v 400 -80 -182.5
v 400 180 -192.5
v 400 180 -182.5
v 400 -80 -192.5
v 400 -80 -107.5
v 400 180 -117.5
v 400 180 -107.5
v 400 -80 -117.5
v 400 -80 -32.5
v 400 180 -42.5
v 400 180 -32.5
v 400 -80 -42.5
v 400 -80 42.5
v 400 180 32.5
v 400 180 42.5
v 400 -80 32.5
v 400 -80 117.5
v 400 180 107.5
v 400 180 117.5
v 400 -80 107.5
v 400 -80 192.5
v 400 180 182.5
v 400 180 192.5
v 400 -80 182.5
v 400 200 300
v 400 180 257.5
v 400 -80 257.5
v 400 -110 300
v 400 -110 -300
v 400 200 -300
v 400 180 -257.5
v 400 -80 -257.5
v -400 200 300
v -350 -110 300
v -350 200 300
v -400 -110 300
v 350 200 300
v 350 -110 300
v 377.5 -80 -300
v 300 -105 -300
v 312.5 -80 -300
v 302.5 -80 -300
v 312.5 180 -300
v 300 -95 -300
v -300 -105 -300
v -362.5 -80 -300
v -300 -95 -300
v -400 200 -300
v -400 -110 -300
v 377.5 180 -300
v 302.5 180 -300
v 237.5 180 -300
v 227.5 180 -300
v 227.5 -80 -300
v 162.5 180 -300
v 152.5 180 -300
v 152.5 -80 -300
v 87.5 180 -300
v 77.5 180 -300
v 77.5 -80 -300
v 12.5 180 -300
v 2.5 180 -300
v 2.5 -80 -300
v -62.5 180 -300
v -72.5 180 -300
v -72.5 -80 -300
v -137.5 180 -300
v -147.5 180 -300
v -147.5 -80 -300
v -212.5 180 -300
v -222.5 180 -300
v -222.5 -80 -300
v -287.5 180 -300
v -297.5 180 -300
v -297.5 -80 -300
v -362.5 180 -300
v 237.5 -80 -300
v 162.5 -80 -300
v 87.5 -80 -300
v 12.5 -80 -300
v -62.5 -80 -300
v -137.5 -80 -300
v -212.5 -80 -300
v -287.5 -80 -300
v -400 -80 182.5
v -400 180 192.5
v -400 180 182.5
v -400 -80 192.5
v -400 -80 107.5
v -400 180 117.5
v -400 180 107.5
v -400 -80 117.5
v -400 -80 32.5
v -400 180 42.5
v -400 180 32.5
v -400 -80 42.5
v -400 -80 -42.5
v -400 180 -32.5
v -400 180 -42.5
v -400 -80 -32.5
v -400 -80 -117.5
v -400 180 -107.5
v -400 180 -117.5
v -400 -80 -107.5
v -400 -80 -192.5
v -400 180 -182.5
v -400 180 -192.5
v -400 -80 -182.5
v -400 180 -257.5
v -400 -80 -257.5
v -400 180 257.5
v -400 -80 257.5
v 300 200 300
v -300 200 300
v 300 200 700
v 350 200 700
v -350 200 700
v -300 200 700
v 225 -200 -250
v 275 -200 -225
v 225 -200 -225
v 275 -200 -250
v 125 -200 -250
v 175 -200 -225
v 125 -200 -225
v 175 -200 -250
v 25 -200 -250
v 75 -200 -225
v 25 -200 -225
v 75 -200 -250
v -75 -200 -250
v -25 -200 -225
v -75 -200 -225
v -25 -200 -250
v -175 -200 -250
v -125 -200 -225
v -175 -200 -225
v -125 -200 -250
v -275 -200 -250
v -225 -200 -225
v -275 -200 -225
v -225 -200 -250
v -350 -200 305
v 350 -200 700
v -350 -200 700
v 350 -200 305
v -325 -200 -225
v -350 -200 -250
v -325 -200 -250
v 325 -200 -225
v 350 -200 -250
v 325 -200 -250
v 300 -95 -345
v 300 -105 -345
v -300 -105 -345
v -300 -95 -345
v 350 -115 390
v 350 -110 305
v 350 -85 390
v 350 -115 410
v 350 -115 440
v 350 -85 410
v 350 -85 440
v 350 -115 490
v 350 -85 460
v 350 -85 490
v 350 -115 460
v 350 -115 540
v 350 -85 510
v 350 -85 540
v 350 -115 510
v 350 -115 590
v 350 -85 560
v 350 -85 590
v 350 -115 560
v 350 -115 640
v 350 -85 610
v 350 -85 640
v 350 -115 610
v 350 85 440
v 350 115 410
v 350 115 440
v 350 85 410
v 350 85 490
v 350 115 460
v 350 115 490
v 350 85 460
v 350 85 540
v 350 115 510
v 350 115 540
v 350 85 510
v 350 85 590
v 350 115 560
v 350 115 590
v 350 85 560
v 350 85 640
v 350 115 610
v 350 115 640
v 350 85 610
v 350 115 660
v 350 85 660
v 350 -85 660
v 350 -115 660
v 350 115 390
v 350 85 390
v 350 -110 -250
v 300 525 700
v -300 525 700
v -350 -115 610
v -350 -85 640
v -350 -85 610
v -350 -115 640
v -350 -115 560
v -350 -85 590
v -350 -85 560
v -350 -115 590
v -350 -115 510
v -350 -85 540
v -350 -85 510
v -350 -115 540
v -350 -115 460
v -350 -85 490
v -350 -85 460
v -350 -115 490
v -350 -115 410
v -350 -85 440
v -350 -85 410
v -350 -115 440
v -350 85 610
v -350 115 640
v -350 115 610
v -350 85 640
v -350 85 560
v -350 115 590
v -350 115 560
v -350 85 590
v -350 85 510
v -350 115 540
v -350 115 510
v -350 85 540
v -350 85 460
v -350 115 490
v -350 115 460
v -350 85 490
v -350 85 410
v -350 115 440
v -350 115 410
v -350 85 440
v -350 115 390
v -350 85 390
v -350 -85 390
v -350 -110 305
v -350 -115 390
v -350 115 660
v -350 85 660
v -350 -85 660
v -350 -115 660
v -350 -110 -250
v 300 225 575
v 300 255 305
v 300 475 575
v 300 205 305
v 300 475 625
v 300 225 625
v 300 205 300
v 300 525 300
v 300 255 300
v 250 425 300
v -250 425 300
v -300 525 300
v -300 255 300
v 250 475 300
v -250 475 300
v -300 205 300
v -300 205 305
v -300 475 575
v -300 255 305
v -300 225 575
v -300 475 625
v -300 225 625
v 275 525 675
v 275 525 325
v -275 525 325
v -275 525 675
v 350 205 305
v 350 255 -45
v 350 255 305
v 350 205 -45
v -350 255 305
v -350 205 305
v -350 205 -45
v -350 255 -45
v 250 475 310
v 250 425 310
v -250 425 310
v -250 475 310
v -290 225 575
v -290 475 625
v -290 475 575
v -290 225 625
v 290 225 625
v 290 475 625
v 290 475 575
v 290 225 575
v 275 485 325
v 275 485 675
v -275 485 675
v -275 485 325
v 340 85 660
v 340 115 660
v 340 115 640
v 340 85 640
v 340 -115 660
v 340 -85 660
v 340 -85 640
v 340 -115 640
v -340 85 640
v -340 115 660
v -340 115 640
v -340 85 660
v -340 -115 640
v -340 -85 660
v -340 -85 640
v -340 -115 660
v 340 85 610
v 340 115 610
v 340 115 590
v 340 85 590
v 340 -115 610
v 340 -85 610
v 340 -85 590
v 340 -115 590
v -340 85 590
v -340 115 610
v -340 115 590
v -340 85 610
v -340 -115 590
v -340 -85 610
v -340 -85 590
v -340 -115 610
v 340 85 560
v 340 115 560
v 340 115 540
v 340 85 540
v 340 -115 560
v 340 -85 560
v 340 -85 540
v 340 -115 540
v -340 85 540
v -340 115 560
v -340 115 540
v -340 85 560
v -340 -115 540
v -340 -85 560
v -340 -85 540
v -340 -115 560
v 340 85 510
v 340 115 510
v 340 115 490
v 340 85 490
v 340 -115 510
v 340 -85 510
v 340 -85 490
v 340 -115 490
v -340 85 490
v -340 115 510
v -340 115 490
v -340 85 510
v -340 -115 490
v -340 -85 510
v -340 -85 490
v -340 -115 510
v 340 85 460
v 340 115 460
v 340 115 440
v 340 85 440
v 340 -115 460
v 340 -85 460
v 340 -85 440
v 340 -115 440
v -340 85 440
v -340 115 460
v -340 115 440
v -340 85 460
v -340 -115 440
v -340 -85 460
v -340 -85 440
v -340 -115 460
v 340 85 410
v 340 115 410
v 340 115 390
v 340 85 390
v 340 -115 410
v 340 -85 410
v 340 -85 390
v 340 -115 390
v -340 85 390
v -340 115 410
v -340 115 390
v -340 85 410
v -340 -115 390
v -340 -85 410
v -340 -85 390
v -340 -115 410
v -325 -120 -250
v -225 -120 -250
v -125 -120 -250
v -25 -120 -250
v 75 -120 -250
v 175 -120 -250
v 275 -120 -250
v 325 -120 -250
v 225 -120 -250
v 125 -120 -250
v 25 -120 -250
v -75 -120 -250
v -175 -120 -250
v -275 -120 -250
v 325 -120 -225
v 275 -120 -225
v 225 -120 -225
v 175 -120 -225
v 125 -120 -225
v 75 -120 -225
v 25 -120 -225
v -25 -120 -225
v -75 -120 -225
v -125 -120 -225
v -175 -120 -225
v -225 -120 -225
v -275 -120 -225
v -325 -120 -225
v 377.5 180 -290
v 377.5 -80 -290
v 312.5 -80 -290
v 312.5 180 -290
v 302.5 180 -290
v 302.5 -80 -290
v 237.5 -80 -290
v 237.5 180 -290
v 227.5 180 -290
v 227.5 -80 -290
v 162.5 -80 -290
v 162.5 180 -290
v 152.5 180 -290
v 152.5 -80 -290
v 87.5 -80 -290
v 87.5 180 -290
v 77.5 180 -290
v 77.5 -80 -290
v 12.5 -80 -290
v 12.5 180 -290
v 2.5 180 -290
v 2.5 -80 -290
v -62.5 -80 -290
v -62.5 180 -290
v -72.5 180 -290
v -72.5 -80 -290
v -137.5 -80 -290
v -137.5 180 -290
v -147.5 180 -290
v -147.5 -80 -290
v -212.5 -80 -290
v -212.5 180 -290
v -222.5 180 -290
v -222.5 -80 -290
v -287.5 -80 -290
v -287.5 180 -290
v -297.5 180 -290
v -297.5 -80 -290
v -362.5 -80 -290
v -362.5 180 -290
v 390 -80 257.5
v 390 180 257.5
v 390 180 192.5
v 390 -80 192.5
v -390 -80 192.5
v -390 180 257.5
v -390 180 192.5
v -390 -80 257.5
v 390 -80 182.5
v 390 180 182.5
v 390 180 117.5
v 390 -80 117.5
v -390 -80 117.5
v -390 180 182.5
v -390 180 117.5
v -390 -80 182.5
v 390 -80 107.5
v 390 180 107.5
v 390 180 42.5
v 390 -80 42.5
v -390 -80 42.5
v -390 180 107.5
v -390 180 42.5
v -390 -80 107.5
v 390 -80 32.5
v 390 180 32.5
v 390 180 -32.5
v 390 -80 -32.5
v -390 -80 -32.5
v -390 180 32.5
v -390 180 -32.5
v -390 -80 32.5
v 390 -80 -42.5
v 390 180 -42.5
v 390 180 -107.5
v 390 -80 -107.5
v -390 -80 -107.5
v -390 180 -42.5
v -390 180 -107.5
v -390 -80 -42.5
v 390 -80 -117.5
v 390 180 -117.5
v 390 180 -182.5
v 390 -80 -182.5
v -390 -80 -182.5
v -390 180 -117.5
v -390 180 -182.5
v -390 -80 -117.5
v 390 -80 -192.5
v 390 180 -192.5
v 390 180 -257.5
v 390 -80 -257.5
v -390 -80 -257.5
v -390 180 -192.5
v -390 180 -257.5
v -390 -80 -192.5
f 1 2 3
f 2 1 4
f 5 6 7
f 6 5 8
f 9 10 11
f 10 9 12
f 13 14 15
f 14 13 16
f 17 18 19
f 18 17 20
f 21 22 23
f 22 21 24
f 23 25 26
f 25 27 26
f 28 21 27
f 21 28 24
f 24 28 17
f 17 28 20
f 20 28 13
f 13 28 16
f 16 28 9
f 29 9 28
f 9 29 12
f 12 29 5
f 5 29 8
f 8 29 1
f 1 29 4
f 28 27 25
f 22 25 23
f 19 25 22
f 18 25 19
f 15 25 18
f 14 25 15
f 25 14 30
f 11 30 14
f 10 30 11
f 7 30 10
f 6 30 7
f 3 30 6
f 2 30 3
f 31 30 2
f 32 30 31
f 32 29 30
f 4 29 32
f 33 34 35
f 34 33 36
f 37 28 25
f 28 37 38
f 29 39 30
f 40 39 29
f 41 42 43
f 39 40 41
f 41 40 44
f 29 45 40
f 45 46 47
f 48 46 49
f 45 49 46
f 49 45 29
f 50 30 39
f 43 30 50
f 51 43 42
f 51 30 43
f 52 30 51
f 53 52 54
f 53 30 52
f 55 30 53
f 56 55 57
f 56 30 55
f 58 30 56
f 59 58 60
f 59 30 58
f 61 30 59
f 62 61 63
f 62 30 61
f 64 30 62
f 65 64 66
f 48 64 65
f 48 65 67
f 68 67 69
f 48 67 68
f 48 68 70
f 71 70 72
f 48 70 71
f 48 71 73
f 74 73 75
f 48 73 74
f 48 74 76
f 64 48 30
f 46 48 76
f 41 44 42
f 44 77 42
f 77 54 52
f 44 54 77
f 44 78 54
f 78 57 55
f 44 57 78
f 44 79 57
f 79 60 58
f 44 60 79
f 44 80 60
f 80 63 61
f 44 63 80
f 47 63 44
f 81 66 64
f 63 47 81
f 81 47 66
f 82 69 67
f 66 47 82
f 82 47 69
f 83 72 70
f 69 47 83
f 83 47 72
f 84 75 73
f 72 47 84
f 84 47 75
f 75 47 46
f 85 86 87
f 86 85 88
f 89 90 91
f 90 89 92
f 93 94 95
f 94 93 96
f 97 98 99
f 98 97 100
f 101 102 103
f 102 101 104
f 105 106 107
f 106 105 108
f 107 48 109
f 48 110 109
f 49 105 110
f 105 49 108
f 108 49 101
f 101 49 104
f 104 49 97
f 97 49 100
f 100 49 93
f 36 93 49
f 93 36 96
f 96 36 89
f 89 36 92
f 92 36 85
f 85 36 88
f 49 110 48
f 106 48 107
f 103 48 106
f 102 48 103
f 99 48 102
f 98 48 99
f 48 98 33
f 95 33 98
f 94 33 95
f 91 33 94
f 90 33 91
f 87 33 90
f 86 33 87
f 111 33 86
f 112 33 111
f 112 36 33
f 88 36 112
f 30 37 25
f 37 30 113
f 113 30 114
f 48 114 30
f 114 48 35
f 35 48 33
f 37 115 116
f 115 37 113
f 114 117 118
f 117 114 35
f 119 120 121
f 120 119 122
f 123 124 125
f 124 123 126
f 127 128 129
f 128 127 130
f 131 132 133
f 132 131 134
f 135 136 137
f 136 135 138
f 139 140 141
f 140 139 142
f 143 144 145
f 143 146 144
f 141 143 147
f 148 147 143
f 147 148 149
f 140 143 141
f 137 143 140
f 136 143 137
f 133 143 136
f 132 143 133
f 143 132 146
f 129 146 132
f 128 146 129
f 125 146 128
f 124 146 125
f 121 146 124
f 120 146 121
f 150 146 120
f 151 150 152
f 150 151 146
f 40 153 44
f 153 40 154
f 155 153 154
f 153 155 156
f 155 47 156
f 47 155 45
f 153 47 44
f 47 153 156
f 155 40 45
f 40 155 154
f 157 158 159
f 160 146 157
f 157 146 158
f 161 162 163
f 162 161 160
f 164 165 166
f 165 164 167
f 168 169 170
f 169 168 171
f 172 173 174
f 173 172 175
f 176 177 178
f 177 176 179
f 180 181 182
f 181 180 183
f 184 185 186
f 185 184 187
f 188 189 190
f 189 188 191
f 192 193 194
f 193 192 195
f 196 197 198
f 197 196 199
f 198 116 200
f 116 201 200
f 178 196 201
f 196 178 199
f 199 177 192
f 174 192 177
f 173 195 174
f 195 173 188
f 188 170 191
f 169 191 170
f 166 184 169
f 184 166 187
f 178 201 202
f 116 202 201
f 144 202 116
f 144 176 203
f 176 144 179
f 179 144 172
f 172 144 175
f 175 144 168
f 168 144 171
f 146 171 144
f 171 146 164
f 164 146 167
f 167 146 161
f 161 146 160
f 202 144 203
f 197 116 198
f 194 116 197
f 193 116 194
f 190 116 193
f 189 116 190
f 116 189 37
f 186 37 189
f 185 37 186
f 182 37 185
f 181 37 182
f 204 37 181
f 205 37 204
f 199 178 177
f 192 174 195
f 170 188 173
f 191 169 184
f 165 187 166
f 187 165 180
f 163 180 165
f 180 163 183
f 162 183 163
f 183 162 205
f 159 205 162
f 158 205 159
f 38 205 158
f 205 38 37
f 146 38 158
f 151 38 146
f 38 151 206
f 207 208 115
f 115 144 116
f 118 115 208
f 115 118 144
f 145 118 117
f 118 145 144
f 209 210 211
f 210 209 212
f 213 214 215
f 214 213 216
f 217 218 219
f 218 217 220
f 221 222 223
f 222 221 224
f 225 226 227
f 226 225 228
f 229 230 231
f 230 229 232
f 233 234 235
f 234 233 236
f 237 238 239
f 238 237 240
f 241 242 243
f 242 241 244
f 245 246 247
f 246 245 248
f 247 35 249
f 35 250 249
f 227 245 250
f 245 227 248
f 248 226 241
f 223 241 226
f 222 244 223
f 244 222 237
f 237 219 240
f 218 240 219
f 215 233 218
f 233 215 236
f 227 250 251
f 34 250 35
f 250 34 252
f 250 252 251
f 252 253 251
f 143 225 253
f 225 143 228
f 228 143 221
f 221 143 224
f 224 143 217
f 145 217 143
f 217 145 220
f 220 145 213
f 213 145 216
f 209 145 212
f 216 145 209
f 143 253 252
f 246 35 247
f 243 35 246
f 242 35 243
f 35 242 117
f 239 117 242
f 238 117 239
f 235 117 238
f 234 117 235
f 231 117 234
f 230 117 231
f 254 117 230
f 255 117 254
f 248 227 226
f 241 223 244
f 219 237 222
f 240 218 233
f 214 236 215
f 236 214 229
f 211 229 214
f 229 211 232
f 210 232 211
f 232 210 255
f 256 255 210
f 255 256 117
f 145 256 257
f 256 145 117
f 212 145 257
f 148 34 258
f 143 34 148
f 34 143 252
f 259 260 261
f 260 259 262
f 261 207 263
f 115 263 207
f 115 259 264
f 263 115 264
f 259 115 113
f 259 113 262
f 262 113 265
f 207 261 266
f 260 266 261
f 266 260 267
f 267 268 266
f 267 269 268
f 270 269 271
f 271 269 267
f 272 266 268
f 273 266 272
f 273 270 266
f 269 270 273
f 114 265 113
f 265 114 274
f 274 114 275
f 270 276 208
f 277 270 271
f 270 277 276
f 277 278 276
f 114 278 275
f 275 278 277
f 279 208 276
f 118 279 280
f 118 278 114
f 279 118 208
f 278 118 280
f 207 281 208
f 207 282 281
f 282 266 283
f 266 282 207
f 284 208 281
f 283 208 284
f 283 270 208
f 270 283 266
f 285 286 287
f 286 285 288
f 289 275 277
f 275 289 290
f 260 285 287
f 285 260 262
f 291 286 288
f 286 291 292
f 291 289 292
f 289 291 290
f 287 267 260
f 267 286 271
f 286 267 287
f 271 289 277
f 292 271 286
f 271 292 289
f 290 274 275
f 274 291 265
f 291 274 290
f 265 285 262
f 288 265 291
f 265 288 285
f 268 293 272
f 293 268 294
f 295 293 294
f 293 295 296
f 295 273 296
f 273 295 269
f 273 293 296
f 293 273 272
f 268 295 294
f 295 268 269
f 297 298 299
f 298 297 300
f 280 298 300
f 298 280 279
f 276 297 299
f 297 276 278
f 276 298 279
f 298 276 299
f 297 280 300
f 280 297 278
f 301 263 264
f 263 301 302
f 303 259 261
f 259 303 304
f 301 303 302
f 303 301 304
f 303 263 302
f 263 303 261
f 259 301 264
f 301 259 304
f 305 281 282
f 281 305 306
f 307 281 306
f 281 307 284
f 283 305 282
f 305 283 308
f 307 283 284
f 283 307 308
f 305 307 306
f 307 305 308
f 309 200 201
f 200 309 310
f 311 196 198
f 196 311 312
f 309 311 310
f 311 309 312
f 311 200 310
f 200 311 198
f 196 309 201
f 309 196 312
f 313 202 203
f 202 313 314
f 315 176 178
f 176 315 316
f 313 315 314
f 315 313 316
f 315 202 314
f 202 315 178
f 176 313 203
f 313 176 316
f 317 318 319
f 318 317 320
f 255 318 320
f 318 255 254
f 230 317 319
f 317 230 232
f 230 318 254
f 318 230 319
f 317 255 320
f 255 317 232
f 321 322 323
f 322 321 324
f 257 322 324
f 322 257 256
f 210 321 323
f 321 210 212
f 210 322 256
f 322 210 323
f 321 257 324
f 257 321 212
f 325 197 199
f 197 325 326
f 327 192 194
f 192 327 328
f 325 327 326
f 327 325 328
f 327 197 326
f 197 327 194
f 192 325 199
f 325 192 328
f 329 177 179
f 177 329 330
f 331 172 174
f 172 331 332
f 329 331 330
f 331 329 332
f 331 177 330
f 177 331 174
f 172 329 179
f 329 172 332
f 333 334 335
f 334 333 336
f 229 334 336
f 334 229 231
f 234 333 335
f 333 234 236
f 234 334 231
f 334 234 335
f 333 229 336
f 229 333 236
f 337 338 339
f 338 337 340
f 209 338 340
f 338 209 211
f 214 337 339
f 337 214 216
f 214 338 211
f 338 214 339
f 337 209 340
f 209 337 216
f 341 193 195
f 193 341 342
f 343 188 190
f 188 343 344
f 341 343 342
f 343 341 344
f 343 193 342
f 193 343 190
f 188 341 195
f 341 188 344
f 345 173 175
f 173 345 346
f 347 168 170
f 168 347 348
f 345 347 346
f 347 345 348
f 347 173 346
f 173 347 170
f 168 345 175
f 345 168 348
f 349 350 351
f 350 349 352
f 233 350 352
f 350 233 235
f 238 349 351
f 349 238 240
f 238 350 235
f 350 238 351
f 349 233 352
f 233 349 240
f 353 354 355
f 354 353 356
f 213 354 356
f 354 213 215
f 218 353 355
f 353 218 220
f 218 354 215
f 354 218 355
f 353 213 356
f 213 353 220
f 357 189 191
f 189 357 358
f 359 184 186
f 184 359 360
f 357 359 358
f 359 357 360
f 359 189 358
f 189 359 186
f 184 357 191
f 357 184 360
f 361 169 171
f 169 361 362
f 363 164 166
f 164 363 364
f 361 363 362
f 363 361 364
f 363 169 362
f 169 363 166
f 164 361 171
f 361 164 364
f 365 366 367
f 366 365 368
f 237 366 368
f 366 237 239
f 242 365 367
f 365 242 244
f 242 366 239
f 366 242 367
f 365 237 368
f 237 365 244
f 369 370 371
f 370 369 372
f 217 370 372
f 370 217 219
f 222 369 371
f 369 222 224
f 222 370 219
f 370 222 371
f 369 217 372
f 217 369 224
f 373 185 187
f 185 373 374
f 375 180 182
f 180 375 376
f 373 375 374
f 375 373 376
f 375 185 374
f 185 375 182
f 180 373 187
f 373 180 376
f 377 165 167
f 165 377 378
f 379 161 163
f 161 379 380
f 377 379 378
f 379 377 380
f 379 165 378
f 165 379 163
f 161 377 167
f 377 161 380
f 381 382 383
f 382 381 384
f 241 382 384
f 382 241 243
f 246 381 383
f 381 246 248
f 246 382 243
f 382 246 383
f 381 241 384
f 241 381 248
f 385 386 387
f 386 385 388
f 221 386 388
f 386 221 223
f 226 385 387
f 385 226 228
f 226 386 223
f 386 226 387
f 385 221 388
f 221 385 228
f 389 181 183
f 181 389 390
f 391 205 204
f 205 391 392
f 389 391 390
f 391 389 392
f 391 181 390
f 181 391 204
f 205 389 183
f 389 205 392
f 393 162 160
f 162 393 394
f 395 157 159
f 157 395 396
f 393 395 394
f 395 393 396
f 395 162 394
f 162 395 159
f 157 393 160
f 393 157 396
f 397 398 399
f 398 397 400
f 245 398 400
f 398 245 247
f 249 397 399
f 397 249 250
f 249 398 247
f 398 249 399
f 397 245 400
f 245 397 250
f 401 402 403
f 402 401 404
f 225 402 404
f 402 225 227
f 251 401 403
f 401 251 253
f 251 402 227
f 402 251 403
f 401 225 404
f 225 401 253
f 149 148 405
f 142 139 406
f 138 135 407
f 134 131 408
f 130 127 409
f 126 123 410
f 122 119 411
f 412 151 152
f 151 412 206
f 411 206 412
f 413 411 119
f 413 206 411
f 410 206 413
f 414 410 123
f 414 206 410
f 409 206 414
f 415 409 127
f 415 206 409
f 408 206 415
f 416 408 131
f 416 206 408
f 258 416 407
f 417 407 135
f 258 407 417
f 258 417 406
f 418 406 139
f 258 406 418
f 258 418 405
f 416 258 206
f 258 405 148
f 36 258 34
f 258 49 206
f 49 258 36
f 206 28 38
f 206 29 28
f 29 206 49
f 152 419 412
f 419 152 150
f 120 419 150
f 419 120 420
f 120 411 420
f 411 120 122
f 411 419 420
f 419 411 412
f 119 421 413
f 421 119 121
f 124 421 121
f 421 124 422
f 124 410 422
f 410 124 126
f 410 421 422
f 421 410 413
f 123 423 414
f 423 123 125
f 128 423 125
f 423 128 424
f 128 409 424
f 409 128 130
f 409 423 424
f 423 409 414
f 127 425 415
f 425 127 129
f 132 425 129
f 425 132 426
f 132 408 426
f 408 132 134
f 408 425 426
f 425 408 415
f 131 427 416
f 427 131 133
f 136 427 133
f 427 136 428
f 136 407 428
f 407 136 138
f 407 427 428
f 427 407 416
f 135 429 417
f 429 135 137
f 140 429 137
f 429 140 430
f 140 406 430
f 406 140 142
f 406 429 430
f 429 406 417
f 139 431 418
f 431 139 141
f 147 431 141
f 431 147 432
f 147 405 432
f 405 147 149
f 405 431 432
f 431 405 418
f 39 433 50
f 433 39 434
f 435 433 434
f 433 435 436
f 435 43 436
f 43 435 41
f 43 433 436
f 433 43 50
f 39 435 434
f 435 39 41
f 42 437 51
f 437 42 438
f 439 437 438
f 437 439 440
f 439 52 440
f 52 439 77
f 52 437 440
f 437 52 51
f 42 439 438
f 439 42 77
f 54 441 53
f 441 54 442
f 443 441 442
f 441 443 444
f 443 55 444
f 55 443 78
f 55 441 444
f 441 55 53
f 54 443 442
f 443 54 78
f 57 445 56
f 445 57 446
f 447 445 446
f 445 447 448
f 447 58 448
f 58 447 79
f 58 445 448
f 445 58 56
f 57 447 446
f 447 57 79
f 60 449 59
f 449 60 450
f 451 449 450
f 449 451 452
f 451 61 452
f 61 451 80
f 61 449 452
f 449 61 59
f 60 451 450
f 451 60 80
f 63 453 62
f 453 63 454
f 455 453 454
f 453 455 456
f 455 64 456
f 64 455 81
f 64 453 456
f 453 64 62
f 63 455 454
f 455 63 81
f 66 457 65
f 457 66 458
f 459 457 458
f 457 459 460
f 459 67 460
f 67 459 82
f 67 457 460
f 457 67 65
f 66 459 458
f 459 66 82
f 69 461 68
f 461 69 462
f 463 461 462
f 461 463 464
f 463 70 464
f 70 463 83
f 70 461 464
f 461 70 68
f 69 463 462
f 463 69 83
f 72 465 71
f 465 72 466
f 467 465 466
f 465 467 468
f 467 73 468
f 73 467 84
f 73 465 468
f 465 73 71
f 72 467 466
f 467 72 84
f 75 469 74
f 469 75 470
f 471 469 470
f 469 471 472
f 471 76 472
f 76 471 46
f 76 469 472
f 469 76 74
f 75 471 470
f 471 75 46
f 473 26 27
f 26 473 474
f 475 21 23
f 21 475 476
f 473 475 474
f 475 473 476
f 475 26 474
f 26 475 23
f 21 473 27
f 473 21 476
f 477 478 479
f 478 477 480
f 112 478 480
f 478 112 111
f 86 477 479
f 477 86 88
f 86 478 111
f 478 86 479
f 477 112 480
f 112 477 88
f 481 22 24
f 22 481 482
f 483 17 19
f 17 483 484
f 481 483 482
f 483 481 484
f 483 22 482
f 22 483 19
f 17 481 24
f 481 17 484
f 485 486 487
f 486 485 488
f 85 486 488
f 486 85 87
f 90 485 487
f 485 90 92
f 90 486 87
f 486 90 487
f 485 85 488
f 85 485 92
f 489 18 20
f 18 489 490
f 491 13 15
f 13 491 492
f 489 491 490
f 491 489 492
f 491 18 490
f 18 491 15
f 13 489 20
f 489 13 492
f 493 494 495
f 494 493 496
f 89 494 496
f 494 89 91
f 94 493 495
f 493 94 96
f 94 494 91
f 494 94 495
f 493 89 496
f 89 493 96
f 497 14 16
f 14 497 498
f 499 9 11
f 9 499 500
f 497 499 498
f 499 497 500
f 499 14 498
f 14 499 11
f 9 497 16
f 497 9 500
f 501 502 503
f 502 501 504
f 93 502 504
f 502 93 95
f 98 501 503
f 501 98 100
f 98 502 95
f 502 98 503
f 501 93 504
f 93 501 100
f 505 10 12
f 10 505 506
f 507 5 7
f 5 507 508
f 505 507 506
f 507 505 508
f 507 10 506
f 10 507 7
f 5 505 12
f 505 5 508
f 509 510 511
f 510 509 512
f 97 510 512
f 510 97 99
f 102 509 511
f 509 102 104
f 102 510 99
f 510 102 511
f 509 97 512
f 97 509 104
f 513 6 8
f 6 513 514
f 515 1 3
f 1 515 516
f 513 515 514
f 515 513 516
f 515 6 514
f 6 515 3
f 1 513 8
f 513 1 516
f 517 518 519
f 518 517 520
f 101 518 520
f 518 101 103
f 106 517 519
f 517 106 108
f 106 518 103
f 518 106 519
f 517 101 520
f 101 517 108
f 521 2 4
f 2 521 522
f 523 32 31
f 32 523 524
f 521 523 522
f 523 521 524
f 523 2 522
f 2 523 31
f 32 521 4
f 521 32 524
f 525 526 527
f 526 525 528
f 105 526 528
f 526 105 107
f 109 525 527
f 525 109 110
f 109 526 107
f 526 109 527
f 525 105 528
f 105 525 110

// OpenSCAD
$fs=0.25;$fa=6;
difference(){difference(){difference(){difference(){difference(){difference(){union() {
cube([800,400,600],center=true);
translate([0,-100,-320])cube([600,10,50],center=true);
translate([0,0,500])cube([700,400,400],center=true);
translate([0,350,500])cube([600,350,400],center=true);
translate([0,230,130])cube([700,50,350],center=true);
}
translate([0,450,300])cube([500,50,20],center=true);
translate([-300,350,600])cube([20,250,50],center=true);
translate([300,350,600])cube([20,250,50],center=true);
translate([0,510,500])cube([550,50,350],center=true);
}translate([350,100,650])cube([20,30,20],center=true);
translate([350,-100,650])cube([20,30,20],center=true);
translate([-350,100,650])cube([20,30,20],center=true);
translate([-350,-100,650])cube([20,30,20],center=true);
translate([350,100,600])cube([20,30,20],center=true);
translate([350,-100,600])cube([20,30,20],center=true);
translate([-350,100,600])cube([20,30,20],center=true);
translate([-350,-100,600])cube([20,30,20],center=true);
translate([350,100,550])cube([20,30,20],center=true);
translate([350,-100,550])cube([20,30,20],center=true);
translate([-350,100,550])cube([20,30,20],center=true);
translate([-350,-100,550])cube([20,30,20],center=true);
translate([350,100,500])cube([20,30,20],center=true);
translate([350,-100,500])cube([20,30,20],center=true);
translate([-350,100,500])cube([20,30,20],center=true);
translate([-350,-100,500])cube([20,30,20],center=true);
translate([350,100,450])cube([20,30,20],center=true);
translate([350,-100,450])cube([20,30,20],center=true);
translate([-350,100,450])cube([20,30,20],center=true);
translate([-350,-100,450])cube([20,30,20],center=true);
translate([350,100,400])cube([20,30,20],center=true);
translate([350,-100,400])cube([20,30,20],center=true);
translate([-350,100,400])cube([20,30,20],center=true);
translate([-350,-100,400])cube([20,30,20],center=true);
}translate([0,-160,-300])cube([850,100,100],center=true);
translate([400,-160,-20])cube([100,100,650],center=true);
translate([-400,-160,-20])cube([100,100,650],center=true);
}translate([300,-160,-240])cube([50,80,30],center=true);
translate([200,-160,-240])cube([50,80,30],center=true);
translate([100,-160,-240])cube([50,80,30],center=true);
translate([0,-160,-240])cube([50,80,30],center=true);
translate([-100,-160,-240])cube([50,80,30],center=true);
translate([-200,-160,-240])cube([50,80,30],center=true);
translate([-300,-160,-240])cube([50,80,30],center=true);
}translate([345,50,-300])cube([65,260,20],center=true);
translate([270,50,-300])cube([65,260,20],center=true);
translate([195,50,-300])cube([65,260,20],center=true);
translate([120,50,-300])cube([65,260,20],center=true);
translate([45,50,-300])cube([65,260,20],center=true);
translate([-30,50,-300])cube([65,260,20],center=true);
translate([-105,50,-300])cube([65,260,20],center=true);
translate([-180,50,-300])cube([65,260,20],center=true);
translate([-255,50,-300])cube([65,260,20],center=true);
translate([-330,50,-300])cube([65,260,20],center=true);
}translate([400,50,225])cube([20,260,65],center=true);
translate([-400,50,225])cube([20,260,65],center=true);
translate([400,50,150])cube([20,260,65],center=true);
translate([-400,50,150])cube([20,260,65],center=true);
translate([400,50,75])cube([20,260,65],center=true);
translate([-400,50,75])cube([20,260,65],center=true);
translate([400,50,0])cube([20,260,65],center=true);
translate([-400,50,0])cube([20,260,65],center=true);
translate([400,50,-75])cube([20,260,65],center=true);
translate([-400,50,-75])cube([20,260,65],center=true);
translate([400,50,-150])cube([20,260,65],center=true);
translate([-400,50,-150])cube([20,260,65],center=true);
translate([400,50,-225])cube([20,260,65],center=true);
translate([-400,50,-225])cube([20,260,65],center=true);
}
